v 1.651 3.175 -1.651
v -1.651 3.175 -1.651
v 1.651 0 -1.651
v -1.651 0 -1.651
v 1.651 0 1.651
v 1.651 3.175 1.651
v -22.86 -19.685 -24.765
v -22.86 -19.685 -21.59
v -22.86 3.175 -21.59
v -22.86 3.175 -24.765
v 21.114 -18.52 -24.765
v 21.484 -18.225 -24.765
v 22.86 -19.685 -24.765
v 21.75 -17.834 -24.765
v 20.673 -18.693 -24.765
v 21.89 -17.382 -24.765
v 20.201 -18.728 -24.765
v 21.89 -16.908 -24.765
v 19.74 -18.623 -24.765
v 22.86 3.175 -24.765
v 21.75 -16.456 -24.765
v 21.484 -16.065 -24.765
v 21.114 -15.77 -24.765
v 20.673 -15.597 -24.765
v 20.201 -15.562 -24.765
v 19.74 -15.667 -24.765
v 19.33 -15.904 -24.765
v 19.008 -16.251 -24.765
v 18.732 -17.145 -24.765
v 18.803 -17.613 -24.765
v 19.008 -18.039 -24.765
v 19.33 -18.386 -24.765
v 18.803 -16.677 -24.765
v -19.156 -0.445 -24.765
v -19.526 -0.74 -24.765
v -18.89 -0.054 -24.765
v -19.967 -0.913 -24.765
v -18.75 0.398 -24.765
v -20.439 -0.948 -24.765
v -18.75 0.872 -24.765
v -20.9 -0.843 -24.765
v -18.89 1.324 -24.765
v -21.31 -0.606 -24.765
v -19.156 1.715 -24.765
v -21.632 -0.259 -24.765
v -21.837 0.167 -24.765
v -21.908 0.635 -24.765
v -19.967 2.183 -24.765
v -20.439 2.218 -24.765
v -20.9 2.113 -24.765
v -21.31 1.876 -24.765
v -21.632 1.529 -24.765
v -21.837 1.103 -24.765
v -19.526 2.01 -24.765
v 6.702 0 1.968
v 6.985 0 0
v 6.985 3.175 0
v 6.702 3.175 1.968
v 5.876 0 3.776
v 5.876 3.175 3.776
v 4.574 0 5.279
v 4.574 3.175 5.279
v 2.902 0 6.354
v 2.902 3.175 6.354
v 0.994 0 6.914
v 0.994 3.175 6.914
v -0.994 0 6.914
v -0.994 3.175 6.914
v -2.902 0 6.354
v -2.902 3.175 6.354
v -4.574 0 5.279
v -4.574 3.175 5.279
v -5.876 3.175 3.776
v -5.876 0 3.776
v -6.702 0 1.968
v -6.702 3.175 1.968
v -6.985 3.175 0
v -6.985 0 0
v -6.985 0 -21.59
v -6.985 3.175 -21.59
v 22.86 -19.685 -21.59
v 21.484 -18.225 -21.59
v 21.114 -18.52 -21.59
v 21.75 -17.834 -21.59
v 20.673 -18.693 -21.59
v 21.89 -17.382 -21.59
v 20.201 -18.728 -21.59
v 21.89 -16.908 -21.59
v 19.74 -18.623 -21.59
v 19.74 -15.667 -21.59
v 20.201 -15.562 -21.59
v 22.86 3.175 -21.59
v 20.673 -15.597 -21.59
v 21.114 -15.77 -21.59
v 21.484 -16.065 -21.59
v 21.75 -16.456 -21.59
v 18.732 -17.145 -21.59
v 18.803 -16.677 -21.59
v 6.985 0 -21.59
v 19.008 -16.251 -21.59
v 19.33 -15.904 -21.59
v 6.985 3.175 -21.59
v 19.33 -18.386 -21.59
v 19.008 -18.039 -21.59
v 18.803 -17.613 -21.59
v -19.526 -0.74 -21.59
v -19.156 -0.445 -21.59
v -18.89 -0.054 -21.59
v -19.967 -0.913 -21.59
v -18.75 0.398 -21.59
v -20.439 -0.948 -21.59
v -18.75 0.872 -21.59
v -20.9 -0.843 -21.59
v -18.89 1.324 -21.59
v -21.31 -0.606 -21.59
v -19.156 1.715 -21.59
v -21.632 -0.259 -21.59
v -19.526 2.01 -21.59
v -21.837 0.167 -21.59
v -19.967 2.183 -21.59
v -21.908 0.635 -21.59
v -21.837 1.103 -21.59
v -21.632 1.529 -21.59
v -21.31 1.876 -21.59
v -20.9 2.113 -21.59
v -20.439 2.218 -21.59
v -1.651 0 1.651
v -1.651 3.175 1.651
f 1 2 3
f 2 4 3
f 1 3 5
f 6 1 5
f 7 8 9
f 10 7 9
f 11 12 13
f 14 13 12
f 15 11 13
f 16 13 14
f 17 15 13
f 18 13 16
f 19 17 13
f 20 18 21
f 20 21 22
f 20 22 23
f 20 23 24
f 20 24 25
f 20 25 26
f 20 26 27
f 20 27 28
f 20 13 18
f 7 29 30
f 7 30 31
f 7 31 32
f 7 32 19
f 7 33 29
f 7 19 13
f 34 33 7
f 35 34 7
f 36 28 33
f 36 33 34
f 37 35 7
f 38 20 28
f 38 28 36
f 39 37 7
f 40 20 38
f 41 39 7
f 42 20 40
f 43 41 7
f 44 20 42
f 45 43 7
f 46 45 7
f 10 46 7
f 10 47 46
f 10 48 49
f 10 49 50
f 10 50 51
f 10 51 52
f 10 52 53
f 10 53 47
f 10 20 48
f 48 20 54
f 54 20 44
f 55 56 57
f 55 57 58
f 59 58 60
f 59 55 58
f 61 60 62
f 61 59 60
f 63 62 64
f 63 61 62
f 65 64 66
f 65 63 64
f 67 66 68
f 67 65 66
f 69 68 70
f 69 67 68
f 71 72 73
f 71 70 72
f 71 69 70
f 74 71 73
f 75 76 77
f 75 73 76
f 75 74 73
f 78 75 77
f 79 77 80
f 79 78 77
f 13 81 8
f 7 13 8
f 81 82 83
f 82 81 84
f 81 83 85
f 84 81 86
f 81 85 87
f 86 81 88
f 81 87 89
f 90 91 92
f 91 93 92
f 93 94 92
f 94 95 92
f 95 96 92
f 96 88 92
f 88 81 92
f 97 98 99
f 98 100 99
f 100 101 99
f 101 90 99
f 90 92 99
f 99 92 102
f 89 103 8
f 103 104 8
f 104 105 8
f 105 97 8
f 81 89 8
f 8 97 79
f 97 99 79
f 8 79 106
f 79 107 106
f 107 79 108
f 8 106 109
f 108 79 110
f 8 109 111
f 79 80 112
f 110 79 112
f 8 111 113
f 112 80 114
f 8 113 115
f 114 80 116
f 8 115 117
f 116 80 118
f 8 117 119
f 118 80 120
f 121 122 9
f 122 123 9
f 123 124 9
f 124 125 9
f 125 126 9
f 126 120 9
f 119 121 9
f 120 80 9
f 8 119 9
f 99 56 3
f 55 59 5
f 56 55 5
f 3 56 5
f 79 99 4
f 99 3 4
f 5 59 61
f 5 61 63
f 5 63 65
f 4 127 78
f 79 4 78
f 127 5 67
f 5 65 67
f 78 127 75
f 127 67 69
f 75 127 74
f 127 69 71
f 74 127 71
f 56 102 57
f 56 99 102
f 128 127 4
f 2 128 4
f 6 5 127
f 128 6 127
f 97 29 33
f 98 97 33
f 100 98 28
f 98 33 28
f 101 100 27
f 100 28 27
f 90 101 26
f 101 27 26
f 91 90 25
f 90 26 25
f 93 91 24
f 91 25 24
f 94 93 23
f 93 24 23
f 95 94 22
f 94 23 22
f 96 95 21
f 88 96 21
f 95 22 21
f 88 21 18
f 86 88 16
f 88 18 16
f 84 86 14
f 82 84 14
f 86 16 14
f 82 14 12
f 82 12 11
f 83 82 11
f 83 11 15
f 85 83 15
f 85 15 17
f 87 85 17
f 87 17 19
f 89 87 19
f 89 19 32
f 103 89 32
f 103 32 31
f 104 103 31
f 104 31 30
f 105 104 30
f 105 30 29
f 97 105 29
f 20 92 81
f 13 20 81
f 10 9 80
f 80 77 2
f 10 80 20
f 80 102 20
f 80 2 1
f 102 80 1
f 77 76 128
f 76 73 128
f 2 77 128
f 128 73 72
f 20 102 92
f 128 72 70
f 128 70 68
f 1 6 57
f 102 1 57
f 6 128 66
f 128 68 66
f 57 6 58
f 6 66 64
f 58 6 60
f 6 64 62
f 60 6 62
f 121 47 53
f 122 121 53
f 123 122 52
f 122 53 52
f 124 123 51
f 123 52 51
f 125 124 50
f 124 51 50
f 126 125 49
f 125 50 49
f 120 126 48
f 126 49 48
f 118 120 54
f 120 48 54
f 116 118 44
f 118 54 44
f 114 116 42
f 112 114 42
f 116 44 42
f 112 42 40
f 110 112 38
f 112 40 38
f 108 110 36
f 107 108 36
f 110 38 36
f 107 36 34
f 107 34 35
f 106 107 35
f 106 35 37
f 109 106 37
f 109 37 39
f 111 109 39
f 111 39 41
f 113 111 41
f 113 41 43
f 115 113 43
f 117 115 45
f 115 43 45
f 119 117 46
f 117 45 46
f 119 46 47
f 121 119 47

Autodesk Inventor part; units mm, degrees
ref_plane "YZ Plane" through (0, 0, 0) normal (1, 0, 0) x (0, 1, 0)
ref_plane "XZ Plane" through (0, 0, 0) normal (0, 1, 0) x (-1, 0, 0)
ref_plane "XY Plane" through (0, 0, 0) normal (0, 0, 1) x (1, 0, 0)
sketch "Sketch1" plane through (0, 0, 0) normal (0, 1, 0) x (-1, 0, 0)
  circle A0 centre (0, 0) radius 6.985
  line L0 (6.985, 0) -> (6.985, -21.59)
  line L1 (6.985, -21.59) -> (-6.985, -21.59)
  line L2 (-6.985, -21.59) -> (-6.985, 0)
  line L3 (0, 0) -> (1.651, 0)
  line L4 (1.651, 0) -> (1.651, -1.651)
  line L5 (1.651, -1.651) -> (-1.651, -1.651)
  line L6 (-1.651, -1.651) -> (-1.651, 1.651)
  line L7 (-1.651, 1.651) -> (1.651, 1.651)
  line L8 (1.651, 1.651) -> (1.651, 0)
  dimension "d0" = 13.97
  dimension "d1" = 21.59
  dimension "d2" = 13.97
  dimension "d3" = 1.651
  dimension "d4" = 1.651
  dimension "d5" = 3.302
  dimension "d6" = 3.302
  dimension "d7" = 3.302
extrude "Extrusion1" add sketch "Sketch1" along normal blind 3.175
sketch "Sketch2" plane through (6.985, 0, -21.59) normal (0, 0, -1) x (-1, 0, 0)
  line L0 (13.97, 3.175) -> (0, 3.175) projected
  line L1 (6.985, 3.175) -> (-15.875, 3.175)
  line L2 (-15.875, 3.175) -> (-15.875, -19.685)
  line L3 (-15.875, -19.685) -> (29.845, -19.685)
  line L4 (29.845, -19.685) -> (29.845, 3.175)
  line L5 (29.845, 3.175) -> (6.985, 3.175)
  point P0 (6.985, 0)
  dimension "d10" = 22.86
  dimension "d11" = 22.86
  dimension "d12" = 45.72
extrude "Extrusion2" add sketch "Sketch2" along normal blind 3.175
sketch "Sketch3" plane through (6.985, 0, -24.765) normal (0, 0, -1) x (-1, 0, 0)
  line L0 (29.845, 3.175) -> (27.305, 3.175)
  line L1 (29.845, 3.175) -> (-15.875, 3.175) projected
  line L2 (27.305, 3.175) -> (27.305, 0.635)
  circle A0 centre (27.305, 0.635) radius 1.5875
  line L3 (-15.875, -19.685) -> (-13.335, -19.685)
  line L4 (-13.335, -19.685) -> (-13.335, -17.145)
  circle A1 centre (-13.335, -17.145) radius 1.5875
  point P0 (6.985, 0)
  dimension "d15" = 2.54
  dimension "d16" = 2.54
  dimension "d17" = 3.175
  dimension "d18" = 2.54
  dimension "d19" = 2.54
  dimension "d20" = 3.175
extrude "Extrusion3" cut sketch "Sketch3" against normal blind 3.175
properties part number "Autonomous - Ultrasonic to Servo"
